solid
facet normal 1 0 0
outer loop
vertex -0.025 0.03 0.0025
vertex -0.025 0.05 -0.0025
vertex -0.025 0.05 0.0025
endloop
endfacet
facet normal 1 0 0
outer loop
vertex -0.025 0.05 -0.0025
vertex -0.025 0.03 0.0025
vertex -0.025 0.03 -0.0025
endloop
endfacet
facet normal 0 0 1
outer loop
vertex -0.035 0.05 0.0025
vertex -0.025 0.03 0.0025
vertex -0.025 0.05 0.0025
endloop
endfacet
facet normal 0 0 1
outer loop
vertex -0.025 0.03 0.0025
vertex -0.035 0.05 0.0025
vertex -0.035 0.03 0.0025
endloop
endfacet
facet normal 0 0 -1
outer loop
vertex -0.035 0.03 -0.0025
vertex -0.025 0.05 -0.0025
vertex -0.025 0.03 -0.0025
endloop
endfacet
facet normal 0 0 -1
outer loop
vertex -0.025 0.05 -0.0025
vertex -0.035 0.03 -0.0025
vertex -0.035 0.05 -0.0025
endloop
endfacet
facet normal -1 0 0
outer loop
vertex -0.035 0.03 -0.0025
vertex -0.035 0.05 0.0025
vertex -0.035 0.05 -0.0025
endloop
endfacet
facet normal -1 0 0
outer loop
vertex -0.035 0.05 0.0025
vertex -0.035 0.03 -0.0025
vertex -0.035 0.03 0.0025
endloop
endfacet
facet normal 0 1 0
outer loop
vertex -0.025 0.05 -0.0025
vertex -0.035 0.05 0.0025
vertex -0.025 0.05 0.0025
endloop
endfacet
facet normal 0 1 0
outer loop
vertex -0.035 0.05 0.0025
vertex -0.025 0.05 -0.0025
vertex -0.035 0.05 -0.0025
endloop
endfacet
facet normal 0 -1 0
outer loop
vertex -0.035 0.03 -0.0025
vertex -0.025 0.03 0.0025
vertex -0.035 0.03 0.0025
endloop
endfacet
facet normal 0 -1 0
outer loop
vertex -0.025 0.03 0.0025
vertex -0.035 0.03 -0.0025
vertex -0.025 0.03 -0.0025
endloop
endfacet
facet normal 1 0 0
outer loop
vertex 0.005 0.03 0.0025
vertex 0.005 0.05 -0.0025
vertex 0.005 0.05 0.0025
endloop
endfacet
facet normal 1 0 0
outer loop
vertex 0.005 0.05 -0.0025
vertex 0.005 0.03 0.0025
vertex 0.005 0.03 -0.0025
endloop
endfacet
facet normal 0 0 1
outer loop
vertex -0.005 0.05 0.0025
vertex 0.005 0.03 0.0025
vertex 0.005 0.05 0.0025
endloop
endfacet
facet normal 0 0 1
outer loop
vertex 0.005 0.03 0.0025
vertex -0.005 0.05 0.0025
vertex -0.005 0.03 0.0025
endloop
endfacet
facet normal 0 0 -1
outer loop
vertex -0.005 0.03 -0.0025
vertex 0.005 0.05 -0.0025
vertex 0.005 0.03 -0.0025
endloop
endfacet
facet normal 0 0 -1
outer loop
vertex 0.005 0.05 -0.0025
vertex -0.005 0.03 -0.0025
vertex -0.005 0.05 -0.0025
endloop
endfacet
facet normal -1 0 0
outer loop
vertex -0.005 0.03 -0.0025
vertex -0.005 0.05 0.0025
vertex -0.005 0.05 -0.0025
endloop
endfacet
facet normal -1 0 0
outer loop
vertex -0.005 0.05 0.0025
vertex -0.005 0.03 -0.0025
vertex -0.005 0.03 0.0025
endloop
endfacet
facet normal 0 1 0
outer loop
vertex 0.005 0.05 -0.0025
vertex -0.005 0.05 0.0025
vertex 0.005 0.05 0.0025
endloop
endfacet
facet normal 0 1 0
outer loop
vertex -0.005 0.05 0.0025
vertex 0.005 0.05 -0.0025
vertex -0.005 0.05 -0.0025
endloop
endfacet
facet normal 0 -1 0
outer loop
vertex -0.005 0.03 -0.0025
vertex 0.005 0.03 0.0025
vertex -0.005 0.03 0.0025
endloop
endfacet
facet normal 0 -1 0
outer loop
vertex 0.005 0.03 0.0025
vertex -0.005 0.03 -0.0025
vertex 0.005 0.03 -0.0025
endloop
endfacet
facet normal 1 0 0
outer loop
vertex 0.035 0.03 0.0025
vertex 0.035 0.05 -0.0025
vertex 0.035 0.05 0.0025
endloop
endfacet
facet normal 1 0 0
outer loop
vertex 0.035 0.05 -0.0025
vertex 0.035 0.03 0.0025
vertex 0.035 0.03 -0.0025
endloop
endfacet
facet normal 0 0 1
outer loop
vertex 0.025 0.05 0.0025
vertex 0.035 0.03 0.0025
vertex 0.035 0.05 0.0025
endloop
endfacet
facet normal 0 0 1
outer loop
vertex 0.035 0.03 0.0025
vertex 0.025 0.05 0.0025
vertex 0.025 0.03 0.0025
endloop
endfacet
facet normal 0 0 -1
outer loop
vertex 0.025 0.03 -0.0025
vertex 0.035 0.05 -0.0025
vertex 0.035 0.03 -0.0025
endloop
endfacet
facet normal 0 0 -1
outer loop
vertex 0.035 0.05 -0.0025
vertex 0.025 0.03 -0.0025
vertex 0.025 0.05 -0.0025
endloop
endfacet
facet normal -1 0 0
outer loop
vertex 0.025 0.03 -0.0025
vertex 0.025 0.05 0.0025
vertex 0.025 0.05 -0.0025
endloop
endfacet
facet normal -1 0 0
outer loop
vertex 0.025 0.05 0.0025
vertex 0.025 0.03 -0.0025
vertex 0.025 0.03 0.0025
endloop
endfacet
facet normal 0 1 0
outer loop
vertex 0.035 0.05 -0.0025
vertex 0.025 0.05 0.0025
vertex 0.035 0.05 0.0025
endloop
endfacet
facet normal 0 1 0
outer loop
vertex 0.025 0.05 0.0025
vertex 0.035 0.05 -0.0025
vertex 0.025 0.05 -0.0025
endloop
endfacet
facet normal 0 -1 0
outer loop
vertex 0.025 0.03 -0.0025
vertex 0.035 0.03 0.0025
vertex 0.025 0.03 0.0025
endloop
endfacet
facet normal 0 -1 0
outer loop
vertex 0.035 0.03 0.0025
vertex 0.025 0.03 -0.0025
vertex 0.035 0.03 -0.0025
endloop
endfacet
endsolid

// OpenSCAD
module rounded_rectangle_block() {
    difference() {
        // Main rounded rectangle block
        offset(r=0.01) {
            cube([0.08, 0.08, 0.01], center=true);
        }
        // Recessed pattern on large faces
        translate([0, 0, 0.005])
            offset(r=0.005) {
                cube([0.06, 0.06, 0.001], center=true);
            }
    }
}

module protrusions() {
    for (i = [-0.03, 0, 0.03]) {
        translate([i, 0.04, -0.005])
            cube([0.01, 0.02, 0.005], center=true);
    }
}

translate([0, 0, 0.005])
    union() {
        rounded_rectangle_block();
        protrusions();
    }
